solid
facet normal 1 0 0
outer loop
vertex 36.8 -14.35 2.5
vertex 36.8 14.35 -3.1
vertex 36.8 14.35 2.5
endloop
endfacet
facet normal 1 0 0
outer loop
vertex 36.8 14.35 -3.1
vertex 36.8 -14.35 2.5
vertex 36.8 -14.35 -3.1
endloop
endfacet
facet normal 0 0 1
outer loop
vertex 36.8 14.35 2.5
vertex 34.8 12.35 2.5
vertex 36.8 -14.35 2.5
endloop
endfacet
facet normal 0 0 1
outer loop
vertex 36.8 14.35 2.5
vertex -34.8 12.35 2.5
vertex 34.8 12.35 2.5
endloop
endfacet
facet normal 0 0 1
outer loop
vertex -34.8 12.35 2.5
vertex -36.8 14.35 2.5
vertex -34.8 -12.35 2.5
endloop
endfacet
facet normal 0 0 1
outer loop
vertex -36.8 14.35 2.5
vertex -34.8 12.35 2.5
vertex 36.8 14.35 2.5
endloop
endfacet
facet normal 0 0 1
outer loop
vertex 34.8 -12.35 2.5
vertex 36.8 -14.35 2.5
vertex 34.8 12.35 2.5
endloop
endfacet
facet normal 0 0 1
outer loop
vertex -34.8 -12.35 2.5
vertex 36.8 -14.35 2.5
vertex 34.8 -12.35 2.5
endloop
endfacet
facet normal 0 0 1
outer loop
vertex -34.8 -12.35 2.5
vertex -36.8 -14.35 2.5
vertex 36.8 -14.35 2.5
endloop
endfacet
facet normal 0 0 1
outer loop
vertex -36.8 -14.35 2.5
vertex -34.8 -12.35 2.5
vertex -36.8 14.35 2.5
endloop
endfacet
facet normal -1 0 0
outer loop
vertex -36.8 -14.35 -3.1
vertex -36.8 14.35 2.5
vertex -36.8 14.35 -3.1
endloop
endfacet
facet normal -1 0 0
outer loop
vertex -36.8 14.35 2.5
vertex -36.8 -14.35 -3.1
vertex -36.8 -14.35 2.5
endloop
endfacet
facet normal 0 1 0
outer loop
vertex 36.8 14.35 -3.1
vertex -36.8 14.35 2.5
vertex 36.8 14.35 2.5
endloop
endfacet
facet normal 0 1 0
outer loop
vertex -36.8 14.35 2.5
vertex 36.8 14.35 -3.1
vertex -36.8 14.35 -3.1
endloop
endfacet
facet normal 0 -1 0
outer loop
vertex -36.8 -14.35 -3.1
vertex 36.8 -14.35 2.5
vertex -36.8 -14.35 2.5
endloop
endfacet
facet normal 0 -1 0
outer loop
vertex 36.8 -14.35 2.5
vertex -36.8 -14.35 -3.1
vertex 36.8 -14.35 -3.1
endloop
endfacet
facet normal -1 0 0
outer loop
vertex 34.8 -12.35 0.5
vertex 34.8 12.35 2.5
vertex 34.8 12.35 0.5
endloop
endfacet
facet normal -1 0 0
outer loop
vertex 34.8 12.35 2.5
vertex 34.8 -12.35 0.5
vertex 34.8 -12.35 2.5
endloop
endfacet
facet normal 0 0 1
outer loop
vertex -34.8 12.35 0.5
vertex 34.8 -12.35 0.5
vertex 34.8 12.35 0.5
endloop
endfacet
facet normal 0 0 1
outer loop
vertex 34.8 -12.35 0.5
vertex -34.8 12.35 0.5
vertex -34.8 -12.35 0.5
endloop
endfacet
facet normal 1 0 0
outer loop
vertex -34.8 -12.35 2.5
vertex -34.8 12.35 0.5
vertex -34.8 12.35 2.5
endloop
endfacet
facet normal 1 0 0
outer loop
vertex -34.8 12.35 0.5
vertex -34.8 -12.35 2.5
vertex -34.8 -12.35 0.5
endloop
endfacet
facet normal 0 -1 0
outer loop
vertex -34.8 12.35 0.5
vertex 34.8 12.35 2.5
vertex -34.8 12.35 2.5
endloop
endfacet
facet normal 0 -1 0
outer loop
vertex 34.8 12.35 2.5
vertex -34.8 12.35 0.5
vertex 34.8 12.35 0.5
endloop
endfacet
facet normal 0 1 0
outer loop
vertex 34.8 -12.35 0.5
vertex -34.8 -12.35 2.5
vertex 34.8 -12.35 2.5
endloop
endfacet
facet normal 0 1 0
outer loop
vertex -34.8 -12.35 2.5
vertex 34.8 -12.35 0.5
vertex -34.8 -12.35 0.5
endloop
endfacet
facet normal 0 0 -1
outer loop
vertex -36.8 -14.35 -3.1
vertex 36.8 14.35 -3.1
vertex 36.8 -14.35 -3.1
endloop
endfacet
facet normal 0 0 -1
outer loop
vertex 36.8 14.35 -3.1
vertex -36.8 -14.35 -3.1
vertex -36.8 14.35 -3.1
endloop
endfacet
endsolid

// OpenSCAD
// Parameters
width_mm = 73.6; //[36.8:147.2:0.1]
height_mm = 28.7; //[14.35:57.4:0.1]
display_thickness_mm = 5; //[2.5:10:0.1]
pcb_thickness_mm = 1.6; //[0.8:3.2:0.1]
aperture_margin_mm = 2; //[1:6:0.1]
corner_radius_mm = 0.5; //[0:2:0.1]
overlap_mm = 1; //[0.5:2:0.1]
aperture_cut_depth_mm = 1.5; //[0.5:4:0.1]
pcb_enabled = 1; //[0:1:1]

// Display module with viewing aperture
module display() {
  color([0.85, 0.85, 0.8]) { // Off-white for display
    difference() {
      // Main display body
      cube([width_mm, height_mm, display_thickness_mm], center=true);
      // Viewing aperture cutout
      translate([0, 0, display_thickness_mm/2 - aperture_cut_depth_mm/2])
        cube([width_mm - 2*aperture_margin_mm, height_mm - 2*aperture_margin_mm, aperture_cut_depth_mm + overlap_mm], center=true);
    }
  }
}

// PCB/backing plate
module pcb_backing_plate() {
  if (pcb_enabled) {
    color([0.0, 0.4, 0.2]) { // Green for PCB
      translate([0, 0, -display_thickness_mm/2 - pcb_thickness_mm/2 + overlap_mm])
        cube([width_mm, height_mm, pcb_thickness_mm], center=true);
    }
  }
}

// Assembly of display and PCB
module assembly() {
  display();
  pcb_backing_plate();
}

// Final assembly call
assembly();
